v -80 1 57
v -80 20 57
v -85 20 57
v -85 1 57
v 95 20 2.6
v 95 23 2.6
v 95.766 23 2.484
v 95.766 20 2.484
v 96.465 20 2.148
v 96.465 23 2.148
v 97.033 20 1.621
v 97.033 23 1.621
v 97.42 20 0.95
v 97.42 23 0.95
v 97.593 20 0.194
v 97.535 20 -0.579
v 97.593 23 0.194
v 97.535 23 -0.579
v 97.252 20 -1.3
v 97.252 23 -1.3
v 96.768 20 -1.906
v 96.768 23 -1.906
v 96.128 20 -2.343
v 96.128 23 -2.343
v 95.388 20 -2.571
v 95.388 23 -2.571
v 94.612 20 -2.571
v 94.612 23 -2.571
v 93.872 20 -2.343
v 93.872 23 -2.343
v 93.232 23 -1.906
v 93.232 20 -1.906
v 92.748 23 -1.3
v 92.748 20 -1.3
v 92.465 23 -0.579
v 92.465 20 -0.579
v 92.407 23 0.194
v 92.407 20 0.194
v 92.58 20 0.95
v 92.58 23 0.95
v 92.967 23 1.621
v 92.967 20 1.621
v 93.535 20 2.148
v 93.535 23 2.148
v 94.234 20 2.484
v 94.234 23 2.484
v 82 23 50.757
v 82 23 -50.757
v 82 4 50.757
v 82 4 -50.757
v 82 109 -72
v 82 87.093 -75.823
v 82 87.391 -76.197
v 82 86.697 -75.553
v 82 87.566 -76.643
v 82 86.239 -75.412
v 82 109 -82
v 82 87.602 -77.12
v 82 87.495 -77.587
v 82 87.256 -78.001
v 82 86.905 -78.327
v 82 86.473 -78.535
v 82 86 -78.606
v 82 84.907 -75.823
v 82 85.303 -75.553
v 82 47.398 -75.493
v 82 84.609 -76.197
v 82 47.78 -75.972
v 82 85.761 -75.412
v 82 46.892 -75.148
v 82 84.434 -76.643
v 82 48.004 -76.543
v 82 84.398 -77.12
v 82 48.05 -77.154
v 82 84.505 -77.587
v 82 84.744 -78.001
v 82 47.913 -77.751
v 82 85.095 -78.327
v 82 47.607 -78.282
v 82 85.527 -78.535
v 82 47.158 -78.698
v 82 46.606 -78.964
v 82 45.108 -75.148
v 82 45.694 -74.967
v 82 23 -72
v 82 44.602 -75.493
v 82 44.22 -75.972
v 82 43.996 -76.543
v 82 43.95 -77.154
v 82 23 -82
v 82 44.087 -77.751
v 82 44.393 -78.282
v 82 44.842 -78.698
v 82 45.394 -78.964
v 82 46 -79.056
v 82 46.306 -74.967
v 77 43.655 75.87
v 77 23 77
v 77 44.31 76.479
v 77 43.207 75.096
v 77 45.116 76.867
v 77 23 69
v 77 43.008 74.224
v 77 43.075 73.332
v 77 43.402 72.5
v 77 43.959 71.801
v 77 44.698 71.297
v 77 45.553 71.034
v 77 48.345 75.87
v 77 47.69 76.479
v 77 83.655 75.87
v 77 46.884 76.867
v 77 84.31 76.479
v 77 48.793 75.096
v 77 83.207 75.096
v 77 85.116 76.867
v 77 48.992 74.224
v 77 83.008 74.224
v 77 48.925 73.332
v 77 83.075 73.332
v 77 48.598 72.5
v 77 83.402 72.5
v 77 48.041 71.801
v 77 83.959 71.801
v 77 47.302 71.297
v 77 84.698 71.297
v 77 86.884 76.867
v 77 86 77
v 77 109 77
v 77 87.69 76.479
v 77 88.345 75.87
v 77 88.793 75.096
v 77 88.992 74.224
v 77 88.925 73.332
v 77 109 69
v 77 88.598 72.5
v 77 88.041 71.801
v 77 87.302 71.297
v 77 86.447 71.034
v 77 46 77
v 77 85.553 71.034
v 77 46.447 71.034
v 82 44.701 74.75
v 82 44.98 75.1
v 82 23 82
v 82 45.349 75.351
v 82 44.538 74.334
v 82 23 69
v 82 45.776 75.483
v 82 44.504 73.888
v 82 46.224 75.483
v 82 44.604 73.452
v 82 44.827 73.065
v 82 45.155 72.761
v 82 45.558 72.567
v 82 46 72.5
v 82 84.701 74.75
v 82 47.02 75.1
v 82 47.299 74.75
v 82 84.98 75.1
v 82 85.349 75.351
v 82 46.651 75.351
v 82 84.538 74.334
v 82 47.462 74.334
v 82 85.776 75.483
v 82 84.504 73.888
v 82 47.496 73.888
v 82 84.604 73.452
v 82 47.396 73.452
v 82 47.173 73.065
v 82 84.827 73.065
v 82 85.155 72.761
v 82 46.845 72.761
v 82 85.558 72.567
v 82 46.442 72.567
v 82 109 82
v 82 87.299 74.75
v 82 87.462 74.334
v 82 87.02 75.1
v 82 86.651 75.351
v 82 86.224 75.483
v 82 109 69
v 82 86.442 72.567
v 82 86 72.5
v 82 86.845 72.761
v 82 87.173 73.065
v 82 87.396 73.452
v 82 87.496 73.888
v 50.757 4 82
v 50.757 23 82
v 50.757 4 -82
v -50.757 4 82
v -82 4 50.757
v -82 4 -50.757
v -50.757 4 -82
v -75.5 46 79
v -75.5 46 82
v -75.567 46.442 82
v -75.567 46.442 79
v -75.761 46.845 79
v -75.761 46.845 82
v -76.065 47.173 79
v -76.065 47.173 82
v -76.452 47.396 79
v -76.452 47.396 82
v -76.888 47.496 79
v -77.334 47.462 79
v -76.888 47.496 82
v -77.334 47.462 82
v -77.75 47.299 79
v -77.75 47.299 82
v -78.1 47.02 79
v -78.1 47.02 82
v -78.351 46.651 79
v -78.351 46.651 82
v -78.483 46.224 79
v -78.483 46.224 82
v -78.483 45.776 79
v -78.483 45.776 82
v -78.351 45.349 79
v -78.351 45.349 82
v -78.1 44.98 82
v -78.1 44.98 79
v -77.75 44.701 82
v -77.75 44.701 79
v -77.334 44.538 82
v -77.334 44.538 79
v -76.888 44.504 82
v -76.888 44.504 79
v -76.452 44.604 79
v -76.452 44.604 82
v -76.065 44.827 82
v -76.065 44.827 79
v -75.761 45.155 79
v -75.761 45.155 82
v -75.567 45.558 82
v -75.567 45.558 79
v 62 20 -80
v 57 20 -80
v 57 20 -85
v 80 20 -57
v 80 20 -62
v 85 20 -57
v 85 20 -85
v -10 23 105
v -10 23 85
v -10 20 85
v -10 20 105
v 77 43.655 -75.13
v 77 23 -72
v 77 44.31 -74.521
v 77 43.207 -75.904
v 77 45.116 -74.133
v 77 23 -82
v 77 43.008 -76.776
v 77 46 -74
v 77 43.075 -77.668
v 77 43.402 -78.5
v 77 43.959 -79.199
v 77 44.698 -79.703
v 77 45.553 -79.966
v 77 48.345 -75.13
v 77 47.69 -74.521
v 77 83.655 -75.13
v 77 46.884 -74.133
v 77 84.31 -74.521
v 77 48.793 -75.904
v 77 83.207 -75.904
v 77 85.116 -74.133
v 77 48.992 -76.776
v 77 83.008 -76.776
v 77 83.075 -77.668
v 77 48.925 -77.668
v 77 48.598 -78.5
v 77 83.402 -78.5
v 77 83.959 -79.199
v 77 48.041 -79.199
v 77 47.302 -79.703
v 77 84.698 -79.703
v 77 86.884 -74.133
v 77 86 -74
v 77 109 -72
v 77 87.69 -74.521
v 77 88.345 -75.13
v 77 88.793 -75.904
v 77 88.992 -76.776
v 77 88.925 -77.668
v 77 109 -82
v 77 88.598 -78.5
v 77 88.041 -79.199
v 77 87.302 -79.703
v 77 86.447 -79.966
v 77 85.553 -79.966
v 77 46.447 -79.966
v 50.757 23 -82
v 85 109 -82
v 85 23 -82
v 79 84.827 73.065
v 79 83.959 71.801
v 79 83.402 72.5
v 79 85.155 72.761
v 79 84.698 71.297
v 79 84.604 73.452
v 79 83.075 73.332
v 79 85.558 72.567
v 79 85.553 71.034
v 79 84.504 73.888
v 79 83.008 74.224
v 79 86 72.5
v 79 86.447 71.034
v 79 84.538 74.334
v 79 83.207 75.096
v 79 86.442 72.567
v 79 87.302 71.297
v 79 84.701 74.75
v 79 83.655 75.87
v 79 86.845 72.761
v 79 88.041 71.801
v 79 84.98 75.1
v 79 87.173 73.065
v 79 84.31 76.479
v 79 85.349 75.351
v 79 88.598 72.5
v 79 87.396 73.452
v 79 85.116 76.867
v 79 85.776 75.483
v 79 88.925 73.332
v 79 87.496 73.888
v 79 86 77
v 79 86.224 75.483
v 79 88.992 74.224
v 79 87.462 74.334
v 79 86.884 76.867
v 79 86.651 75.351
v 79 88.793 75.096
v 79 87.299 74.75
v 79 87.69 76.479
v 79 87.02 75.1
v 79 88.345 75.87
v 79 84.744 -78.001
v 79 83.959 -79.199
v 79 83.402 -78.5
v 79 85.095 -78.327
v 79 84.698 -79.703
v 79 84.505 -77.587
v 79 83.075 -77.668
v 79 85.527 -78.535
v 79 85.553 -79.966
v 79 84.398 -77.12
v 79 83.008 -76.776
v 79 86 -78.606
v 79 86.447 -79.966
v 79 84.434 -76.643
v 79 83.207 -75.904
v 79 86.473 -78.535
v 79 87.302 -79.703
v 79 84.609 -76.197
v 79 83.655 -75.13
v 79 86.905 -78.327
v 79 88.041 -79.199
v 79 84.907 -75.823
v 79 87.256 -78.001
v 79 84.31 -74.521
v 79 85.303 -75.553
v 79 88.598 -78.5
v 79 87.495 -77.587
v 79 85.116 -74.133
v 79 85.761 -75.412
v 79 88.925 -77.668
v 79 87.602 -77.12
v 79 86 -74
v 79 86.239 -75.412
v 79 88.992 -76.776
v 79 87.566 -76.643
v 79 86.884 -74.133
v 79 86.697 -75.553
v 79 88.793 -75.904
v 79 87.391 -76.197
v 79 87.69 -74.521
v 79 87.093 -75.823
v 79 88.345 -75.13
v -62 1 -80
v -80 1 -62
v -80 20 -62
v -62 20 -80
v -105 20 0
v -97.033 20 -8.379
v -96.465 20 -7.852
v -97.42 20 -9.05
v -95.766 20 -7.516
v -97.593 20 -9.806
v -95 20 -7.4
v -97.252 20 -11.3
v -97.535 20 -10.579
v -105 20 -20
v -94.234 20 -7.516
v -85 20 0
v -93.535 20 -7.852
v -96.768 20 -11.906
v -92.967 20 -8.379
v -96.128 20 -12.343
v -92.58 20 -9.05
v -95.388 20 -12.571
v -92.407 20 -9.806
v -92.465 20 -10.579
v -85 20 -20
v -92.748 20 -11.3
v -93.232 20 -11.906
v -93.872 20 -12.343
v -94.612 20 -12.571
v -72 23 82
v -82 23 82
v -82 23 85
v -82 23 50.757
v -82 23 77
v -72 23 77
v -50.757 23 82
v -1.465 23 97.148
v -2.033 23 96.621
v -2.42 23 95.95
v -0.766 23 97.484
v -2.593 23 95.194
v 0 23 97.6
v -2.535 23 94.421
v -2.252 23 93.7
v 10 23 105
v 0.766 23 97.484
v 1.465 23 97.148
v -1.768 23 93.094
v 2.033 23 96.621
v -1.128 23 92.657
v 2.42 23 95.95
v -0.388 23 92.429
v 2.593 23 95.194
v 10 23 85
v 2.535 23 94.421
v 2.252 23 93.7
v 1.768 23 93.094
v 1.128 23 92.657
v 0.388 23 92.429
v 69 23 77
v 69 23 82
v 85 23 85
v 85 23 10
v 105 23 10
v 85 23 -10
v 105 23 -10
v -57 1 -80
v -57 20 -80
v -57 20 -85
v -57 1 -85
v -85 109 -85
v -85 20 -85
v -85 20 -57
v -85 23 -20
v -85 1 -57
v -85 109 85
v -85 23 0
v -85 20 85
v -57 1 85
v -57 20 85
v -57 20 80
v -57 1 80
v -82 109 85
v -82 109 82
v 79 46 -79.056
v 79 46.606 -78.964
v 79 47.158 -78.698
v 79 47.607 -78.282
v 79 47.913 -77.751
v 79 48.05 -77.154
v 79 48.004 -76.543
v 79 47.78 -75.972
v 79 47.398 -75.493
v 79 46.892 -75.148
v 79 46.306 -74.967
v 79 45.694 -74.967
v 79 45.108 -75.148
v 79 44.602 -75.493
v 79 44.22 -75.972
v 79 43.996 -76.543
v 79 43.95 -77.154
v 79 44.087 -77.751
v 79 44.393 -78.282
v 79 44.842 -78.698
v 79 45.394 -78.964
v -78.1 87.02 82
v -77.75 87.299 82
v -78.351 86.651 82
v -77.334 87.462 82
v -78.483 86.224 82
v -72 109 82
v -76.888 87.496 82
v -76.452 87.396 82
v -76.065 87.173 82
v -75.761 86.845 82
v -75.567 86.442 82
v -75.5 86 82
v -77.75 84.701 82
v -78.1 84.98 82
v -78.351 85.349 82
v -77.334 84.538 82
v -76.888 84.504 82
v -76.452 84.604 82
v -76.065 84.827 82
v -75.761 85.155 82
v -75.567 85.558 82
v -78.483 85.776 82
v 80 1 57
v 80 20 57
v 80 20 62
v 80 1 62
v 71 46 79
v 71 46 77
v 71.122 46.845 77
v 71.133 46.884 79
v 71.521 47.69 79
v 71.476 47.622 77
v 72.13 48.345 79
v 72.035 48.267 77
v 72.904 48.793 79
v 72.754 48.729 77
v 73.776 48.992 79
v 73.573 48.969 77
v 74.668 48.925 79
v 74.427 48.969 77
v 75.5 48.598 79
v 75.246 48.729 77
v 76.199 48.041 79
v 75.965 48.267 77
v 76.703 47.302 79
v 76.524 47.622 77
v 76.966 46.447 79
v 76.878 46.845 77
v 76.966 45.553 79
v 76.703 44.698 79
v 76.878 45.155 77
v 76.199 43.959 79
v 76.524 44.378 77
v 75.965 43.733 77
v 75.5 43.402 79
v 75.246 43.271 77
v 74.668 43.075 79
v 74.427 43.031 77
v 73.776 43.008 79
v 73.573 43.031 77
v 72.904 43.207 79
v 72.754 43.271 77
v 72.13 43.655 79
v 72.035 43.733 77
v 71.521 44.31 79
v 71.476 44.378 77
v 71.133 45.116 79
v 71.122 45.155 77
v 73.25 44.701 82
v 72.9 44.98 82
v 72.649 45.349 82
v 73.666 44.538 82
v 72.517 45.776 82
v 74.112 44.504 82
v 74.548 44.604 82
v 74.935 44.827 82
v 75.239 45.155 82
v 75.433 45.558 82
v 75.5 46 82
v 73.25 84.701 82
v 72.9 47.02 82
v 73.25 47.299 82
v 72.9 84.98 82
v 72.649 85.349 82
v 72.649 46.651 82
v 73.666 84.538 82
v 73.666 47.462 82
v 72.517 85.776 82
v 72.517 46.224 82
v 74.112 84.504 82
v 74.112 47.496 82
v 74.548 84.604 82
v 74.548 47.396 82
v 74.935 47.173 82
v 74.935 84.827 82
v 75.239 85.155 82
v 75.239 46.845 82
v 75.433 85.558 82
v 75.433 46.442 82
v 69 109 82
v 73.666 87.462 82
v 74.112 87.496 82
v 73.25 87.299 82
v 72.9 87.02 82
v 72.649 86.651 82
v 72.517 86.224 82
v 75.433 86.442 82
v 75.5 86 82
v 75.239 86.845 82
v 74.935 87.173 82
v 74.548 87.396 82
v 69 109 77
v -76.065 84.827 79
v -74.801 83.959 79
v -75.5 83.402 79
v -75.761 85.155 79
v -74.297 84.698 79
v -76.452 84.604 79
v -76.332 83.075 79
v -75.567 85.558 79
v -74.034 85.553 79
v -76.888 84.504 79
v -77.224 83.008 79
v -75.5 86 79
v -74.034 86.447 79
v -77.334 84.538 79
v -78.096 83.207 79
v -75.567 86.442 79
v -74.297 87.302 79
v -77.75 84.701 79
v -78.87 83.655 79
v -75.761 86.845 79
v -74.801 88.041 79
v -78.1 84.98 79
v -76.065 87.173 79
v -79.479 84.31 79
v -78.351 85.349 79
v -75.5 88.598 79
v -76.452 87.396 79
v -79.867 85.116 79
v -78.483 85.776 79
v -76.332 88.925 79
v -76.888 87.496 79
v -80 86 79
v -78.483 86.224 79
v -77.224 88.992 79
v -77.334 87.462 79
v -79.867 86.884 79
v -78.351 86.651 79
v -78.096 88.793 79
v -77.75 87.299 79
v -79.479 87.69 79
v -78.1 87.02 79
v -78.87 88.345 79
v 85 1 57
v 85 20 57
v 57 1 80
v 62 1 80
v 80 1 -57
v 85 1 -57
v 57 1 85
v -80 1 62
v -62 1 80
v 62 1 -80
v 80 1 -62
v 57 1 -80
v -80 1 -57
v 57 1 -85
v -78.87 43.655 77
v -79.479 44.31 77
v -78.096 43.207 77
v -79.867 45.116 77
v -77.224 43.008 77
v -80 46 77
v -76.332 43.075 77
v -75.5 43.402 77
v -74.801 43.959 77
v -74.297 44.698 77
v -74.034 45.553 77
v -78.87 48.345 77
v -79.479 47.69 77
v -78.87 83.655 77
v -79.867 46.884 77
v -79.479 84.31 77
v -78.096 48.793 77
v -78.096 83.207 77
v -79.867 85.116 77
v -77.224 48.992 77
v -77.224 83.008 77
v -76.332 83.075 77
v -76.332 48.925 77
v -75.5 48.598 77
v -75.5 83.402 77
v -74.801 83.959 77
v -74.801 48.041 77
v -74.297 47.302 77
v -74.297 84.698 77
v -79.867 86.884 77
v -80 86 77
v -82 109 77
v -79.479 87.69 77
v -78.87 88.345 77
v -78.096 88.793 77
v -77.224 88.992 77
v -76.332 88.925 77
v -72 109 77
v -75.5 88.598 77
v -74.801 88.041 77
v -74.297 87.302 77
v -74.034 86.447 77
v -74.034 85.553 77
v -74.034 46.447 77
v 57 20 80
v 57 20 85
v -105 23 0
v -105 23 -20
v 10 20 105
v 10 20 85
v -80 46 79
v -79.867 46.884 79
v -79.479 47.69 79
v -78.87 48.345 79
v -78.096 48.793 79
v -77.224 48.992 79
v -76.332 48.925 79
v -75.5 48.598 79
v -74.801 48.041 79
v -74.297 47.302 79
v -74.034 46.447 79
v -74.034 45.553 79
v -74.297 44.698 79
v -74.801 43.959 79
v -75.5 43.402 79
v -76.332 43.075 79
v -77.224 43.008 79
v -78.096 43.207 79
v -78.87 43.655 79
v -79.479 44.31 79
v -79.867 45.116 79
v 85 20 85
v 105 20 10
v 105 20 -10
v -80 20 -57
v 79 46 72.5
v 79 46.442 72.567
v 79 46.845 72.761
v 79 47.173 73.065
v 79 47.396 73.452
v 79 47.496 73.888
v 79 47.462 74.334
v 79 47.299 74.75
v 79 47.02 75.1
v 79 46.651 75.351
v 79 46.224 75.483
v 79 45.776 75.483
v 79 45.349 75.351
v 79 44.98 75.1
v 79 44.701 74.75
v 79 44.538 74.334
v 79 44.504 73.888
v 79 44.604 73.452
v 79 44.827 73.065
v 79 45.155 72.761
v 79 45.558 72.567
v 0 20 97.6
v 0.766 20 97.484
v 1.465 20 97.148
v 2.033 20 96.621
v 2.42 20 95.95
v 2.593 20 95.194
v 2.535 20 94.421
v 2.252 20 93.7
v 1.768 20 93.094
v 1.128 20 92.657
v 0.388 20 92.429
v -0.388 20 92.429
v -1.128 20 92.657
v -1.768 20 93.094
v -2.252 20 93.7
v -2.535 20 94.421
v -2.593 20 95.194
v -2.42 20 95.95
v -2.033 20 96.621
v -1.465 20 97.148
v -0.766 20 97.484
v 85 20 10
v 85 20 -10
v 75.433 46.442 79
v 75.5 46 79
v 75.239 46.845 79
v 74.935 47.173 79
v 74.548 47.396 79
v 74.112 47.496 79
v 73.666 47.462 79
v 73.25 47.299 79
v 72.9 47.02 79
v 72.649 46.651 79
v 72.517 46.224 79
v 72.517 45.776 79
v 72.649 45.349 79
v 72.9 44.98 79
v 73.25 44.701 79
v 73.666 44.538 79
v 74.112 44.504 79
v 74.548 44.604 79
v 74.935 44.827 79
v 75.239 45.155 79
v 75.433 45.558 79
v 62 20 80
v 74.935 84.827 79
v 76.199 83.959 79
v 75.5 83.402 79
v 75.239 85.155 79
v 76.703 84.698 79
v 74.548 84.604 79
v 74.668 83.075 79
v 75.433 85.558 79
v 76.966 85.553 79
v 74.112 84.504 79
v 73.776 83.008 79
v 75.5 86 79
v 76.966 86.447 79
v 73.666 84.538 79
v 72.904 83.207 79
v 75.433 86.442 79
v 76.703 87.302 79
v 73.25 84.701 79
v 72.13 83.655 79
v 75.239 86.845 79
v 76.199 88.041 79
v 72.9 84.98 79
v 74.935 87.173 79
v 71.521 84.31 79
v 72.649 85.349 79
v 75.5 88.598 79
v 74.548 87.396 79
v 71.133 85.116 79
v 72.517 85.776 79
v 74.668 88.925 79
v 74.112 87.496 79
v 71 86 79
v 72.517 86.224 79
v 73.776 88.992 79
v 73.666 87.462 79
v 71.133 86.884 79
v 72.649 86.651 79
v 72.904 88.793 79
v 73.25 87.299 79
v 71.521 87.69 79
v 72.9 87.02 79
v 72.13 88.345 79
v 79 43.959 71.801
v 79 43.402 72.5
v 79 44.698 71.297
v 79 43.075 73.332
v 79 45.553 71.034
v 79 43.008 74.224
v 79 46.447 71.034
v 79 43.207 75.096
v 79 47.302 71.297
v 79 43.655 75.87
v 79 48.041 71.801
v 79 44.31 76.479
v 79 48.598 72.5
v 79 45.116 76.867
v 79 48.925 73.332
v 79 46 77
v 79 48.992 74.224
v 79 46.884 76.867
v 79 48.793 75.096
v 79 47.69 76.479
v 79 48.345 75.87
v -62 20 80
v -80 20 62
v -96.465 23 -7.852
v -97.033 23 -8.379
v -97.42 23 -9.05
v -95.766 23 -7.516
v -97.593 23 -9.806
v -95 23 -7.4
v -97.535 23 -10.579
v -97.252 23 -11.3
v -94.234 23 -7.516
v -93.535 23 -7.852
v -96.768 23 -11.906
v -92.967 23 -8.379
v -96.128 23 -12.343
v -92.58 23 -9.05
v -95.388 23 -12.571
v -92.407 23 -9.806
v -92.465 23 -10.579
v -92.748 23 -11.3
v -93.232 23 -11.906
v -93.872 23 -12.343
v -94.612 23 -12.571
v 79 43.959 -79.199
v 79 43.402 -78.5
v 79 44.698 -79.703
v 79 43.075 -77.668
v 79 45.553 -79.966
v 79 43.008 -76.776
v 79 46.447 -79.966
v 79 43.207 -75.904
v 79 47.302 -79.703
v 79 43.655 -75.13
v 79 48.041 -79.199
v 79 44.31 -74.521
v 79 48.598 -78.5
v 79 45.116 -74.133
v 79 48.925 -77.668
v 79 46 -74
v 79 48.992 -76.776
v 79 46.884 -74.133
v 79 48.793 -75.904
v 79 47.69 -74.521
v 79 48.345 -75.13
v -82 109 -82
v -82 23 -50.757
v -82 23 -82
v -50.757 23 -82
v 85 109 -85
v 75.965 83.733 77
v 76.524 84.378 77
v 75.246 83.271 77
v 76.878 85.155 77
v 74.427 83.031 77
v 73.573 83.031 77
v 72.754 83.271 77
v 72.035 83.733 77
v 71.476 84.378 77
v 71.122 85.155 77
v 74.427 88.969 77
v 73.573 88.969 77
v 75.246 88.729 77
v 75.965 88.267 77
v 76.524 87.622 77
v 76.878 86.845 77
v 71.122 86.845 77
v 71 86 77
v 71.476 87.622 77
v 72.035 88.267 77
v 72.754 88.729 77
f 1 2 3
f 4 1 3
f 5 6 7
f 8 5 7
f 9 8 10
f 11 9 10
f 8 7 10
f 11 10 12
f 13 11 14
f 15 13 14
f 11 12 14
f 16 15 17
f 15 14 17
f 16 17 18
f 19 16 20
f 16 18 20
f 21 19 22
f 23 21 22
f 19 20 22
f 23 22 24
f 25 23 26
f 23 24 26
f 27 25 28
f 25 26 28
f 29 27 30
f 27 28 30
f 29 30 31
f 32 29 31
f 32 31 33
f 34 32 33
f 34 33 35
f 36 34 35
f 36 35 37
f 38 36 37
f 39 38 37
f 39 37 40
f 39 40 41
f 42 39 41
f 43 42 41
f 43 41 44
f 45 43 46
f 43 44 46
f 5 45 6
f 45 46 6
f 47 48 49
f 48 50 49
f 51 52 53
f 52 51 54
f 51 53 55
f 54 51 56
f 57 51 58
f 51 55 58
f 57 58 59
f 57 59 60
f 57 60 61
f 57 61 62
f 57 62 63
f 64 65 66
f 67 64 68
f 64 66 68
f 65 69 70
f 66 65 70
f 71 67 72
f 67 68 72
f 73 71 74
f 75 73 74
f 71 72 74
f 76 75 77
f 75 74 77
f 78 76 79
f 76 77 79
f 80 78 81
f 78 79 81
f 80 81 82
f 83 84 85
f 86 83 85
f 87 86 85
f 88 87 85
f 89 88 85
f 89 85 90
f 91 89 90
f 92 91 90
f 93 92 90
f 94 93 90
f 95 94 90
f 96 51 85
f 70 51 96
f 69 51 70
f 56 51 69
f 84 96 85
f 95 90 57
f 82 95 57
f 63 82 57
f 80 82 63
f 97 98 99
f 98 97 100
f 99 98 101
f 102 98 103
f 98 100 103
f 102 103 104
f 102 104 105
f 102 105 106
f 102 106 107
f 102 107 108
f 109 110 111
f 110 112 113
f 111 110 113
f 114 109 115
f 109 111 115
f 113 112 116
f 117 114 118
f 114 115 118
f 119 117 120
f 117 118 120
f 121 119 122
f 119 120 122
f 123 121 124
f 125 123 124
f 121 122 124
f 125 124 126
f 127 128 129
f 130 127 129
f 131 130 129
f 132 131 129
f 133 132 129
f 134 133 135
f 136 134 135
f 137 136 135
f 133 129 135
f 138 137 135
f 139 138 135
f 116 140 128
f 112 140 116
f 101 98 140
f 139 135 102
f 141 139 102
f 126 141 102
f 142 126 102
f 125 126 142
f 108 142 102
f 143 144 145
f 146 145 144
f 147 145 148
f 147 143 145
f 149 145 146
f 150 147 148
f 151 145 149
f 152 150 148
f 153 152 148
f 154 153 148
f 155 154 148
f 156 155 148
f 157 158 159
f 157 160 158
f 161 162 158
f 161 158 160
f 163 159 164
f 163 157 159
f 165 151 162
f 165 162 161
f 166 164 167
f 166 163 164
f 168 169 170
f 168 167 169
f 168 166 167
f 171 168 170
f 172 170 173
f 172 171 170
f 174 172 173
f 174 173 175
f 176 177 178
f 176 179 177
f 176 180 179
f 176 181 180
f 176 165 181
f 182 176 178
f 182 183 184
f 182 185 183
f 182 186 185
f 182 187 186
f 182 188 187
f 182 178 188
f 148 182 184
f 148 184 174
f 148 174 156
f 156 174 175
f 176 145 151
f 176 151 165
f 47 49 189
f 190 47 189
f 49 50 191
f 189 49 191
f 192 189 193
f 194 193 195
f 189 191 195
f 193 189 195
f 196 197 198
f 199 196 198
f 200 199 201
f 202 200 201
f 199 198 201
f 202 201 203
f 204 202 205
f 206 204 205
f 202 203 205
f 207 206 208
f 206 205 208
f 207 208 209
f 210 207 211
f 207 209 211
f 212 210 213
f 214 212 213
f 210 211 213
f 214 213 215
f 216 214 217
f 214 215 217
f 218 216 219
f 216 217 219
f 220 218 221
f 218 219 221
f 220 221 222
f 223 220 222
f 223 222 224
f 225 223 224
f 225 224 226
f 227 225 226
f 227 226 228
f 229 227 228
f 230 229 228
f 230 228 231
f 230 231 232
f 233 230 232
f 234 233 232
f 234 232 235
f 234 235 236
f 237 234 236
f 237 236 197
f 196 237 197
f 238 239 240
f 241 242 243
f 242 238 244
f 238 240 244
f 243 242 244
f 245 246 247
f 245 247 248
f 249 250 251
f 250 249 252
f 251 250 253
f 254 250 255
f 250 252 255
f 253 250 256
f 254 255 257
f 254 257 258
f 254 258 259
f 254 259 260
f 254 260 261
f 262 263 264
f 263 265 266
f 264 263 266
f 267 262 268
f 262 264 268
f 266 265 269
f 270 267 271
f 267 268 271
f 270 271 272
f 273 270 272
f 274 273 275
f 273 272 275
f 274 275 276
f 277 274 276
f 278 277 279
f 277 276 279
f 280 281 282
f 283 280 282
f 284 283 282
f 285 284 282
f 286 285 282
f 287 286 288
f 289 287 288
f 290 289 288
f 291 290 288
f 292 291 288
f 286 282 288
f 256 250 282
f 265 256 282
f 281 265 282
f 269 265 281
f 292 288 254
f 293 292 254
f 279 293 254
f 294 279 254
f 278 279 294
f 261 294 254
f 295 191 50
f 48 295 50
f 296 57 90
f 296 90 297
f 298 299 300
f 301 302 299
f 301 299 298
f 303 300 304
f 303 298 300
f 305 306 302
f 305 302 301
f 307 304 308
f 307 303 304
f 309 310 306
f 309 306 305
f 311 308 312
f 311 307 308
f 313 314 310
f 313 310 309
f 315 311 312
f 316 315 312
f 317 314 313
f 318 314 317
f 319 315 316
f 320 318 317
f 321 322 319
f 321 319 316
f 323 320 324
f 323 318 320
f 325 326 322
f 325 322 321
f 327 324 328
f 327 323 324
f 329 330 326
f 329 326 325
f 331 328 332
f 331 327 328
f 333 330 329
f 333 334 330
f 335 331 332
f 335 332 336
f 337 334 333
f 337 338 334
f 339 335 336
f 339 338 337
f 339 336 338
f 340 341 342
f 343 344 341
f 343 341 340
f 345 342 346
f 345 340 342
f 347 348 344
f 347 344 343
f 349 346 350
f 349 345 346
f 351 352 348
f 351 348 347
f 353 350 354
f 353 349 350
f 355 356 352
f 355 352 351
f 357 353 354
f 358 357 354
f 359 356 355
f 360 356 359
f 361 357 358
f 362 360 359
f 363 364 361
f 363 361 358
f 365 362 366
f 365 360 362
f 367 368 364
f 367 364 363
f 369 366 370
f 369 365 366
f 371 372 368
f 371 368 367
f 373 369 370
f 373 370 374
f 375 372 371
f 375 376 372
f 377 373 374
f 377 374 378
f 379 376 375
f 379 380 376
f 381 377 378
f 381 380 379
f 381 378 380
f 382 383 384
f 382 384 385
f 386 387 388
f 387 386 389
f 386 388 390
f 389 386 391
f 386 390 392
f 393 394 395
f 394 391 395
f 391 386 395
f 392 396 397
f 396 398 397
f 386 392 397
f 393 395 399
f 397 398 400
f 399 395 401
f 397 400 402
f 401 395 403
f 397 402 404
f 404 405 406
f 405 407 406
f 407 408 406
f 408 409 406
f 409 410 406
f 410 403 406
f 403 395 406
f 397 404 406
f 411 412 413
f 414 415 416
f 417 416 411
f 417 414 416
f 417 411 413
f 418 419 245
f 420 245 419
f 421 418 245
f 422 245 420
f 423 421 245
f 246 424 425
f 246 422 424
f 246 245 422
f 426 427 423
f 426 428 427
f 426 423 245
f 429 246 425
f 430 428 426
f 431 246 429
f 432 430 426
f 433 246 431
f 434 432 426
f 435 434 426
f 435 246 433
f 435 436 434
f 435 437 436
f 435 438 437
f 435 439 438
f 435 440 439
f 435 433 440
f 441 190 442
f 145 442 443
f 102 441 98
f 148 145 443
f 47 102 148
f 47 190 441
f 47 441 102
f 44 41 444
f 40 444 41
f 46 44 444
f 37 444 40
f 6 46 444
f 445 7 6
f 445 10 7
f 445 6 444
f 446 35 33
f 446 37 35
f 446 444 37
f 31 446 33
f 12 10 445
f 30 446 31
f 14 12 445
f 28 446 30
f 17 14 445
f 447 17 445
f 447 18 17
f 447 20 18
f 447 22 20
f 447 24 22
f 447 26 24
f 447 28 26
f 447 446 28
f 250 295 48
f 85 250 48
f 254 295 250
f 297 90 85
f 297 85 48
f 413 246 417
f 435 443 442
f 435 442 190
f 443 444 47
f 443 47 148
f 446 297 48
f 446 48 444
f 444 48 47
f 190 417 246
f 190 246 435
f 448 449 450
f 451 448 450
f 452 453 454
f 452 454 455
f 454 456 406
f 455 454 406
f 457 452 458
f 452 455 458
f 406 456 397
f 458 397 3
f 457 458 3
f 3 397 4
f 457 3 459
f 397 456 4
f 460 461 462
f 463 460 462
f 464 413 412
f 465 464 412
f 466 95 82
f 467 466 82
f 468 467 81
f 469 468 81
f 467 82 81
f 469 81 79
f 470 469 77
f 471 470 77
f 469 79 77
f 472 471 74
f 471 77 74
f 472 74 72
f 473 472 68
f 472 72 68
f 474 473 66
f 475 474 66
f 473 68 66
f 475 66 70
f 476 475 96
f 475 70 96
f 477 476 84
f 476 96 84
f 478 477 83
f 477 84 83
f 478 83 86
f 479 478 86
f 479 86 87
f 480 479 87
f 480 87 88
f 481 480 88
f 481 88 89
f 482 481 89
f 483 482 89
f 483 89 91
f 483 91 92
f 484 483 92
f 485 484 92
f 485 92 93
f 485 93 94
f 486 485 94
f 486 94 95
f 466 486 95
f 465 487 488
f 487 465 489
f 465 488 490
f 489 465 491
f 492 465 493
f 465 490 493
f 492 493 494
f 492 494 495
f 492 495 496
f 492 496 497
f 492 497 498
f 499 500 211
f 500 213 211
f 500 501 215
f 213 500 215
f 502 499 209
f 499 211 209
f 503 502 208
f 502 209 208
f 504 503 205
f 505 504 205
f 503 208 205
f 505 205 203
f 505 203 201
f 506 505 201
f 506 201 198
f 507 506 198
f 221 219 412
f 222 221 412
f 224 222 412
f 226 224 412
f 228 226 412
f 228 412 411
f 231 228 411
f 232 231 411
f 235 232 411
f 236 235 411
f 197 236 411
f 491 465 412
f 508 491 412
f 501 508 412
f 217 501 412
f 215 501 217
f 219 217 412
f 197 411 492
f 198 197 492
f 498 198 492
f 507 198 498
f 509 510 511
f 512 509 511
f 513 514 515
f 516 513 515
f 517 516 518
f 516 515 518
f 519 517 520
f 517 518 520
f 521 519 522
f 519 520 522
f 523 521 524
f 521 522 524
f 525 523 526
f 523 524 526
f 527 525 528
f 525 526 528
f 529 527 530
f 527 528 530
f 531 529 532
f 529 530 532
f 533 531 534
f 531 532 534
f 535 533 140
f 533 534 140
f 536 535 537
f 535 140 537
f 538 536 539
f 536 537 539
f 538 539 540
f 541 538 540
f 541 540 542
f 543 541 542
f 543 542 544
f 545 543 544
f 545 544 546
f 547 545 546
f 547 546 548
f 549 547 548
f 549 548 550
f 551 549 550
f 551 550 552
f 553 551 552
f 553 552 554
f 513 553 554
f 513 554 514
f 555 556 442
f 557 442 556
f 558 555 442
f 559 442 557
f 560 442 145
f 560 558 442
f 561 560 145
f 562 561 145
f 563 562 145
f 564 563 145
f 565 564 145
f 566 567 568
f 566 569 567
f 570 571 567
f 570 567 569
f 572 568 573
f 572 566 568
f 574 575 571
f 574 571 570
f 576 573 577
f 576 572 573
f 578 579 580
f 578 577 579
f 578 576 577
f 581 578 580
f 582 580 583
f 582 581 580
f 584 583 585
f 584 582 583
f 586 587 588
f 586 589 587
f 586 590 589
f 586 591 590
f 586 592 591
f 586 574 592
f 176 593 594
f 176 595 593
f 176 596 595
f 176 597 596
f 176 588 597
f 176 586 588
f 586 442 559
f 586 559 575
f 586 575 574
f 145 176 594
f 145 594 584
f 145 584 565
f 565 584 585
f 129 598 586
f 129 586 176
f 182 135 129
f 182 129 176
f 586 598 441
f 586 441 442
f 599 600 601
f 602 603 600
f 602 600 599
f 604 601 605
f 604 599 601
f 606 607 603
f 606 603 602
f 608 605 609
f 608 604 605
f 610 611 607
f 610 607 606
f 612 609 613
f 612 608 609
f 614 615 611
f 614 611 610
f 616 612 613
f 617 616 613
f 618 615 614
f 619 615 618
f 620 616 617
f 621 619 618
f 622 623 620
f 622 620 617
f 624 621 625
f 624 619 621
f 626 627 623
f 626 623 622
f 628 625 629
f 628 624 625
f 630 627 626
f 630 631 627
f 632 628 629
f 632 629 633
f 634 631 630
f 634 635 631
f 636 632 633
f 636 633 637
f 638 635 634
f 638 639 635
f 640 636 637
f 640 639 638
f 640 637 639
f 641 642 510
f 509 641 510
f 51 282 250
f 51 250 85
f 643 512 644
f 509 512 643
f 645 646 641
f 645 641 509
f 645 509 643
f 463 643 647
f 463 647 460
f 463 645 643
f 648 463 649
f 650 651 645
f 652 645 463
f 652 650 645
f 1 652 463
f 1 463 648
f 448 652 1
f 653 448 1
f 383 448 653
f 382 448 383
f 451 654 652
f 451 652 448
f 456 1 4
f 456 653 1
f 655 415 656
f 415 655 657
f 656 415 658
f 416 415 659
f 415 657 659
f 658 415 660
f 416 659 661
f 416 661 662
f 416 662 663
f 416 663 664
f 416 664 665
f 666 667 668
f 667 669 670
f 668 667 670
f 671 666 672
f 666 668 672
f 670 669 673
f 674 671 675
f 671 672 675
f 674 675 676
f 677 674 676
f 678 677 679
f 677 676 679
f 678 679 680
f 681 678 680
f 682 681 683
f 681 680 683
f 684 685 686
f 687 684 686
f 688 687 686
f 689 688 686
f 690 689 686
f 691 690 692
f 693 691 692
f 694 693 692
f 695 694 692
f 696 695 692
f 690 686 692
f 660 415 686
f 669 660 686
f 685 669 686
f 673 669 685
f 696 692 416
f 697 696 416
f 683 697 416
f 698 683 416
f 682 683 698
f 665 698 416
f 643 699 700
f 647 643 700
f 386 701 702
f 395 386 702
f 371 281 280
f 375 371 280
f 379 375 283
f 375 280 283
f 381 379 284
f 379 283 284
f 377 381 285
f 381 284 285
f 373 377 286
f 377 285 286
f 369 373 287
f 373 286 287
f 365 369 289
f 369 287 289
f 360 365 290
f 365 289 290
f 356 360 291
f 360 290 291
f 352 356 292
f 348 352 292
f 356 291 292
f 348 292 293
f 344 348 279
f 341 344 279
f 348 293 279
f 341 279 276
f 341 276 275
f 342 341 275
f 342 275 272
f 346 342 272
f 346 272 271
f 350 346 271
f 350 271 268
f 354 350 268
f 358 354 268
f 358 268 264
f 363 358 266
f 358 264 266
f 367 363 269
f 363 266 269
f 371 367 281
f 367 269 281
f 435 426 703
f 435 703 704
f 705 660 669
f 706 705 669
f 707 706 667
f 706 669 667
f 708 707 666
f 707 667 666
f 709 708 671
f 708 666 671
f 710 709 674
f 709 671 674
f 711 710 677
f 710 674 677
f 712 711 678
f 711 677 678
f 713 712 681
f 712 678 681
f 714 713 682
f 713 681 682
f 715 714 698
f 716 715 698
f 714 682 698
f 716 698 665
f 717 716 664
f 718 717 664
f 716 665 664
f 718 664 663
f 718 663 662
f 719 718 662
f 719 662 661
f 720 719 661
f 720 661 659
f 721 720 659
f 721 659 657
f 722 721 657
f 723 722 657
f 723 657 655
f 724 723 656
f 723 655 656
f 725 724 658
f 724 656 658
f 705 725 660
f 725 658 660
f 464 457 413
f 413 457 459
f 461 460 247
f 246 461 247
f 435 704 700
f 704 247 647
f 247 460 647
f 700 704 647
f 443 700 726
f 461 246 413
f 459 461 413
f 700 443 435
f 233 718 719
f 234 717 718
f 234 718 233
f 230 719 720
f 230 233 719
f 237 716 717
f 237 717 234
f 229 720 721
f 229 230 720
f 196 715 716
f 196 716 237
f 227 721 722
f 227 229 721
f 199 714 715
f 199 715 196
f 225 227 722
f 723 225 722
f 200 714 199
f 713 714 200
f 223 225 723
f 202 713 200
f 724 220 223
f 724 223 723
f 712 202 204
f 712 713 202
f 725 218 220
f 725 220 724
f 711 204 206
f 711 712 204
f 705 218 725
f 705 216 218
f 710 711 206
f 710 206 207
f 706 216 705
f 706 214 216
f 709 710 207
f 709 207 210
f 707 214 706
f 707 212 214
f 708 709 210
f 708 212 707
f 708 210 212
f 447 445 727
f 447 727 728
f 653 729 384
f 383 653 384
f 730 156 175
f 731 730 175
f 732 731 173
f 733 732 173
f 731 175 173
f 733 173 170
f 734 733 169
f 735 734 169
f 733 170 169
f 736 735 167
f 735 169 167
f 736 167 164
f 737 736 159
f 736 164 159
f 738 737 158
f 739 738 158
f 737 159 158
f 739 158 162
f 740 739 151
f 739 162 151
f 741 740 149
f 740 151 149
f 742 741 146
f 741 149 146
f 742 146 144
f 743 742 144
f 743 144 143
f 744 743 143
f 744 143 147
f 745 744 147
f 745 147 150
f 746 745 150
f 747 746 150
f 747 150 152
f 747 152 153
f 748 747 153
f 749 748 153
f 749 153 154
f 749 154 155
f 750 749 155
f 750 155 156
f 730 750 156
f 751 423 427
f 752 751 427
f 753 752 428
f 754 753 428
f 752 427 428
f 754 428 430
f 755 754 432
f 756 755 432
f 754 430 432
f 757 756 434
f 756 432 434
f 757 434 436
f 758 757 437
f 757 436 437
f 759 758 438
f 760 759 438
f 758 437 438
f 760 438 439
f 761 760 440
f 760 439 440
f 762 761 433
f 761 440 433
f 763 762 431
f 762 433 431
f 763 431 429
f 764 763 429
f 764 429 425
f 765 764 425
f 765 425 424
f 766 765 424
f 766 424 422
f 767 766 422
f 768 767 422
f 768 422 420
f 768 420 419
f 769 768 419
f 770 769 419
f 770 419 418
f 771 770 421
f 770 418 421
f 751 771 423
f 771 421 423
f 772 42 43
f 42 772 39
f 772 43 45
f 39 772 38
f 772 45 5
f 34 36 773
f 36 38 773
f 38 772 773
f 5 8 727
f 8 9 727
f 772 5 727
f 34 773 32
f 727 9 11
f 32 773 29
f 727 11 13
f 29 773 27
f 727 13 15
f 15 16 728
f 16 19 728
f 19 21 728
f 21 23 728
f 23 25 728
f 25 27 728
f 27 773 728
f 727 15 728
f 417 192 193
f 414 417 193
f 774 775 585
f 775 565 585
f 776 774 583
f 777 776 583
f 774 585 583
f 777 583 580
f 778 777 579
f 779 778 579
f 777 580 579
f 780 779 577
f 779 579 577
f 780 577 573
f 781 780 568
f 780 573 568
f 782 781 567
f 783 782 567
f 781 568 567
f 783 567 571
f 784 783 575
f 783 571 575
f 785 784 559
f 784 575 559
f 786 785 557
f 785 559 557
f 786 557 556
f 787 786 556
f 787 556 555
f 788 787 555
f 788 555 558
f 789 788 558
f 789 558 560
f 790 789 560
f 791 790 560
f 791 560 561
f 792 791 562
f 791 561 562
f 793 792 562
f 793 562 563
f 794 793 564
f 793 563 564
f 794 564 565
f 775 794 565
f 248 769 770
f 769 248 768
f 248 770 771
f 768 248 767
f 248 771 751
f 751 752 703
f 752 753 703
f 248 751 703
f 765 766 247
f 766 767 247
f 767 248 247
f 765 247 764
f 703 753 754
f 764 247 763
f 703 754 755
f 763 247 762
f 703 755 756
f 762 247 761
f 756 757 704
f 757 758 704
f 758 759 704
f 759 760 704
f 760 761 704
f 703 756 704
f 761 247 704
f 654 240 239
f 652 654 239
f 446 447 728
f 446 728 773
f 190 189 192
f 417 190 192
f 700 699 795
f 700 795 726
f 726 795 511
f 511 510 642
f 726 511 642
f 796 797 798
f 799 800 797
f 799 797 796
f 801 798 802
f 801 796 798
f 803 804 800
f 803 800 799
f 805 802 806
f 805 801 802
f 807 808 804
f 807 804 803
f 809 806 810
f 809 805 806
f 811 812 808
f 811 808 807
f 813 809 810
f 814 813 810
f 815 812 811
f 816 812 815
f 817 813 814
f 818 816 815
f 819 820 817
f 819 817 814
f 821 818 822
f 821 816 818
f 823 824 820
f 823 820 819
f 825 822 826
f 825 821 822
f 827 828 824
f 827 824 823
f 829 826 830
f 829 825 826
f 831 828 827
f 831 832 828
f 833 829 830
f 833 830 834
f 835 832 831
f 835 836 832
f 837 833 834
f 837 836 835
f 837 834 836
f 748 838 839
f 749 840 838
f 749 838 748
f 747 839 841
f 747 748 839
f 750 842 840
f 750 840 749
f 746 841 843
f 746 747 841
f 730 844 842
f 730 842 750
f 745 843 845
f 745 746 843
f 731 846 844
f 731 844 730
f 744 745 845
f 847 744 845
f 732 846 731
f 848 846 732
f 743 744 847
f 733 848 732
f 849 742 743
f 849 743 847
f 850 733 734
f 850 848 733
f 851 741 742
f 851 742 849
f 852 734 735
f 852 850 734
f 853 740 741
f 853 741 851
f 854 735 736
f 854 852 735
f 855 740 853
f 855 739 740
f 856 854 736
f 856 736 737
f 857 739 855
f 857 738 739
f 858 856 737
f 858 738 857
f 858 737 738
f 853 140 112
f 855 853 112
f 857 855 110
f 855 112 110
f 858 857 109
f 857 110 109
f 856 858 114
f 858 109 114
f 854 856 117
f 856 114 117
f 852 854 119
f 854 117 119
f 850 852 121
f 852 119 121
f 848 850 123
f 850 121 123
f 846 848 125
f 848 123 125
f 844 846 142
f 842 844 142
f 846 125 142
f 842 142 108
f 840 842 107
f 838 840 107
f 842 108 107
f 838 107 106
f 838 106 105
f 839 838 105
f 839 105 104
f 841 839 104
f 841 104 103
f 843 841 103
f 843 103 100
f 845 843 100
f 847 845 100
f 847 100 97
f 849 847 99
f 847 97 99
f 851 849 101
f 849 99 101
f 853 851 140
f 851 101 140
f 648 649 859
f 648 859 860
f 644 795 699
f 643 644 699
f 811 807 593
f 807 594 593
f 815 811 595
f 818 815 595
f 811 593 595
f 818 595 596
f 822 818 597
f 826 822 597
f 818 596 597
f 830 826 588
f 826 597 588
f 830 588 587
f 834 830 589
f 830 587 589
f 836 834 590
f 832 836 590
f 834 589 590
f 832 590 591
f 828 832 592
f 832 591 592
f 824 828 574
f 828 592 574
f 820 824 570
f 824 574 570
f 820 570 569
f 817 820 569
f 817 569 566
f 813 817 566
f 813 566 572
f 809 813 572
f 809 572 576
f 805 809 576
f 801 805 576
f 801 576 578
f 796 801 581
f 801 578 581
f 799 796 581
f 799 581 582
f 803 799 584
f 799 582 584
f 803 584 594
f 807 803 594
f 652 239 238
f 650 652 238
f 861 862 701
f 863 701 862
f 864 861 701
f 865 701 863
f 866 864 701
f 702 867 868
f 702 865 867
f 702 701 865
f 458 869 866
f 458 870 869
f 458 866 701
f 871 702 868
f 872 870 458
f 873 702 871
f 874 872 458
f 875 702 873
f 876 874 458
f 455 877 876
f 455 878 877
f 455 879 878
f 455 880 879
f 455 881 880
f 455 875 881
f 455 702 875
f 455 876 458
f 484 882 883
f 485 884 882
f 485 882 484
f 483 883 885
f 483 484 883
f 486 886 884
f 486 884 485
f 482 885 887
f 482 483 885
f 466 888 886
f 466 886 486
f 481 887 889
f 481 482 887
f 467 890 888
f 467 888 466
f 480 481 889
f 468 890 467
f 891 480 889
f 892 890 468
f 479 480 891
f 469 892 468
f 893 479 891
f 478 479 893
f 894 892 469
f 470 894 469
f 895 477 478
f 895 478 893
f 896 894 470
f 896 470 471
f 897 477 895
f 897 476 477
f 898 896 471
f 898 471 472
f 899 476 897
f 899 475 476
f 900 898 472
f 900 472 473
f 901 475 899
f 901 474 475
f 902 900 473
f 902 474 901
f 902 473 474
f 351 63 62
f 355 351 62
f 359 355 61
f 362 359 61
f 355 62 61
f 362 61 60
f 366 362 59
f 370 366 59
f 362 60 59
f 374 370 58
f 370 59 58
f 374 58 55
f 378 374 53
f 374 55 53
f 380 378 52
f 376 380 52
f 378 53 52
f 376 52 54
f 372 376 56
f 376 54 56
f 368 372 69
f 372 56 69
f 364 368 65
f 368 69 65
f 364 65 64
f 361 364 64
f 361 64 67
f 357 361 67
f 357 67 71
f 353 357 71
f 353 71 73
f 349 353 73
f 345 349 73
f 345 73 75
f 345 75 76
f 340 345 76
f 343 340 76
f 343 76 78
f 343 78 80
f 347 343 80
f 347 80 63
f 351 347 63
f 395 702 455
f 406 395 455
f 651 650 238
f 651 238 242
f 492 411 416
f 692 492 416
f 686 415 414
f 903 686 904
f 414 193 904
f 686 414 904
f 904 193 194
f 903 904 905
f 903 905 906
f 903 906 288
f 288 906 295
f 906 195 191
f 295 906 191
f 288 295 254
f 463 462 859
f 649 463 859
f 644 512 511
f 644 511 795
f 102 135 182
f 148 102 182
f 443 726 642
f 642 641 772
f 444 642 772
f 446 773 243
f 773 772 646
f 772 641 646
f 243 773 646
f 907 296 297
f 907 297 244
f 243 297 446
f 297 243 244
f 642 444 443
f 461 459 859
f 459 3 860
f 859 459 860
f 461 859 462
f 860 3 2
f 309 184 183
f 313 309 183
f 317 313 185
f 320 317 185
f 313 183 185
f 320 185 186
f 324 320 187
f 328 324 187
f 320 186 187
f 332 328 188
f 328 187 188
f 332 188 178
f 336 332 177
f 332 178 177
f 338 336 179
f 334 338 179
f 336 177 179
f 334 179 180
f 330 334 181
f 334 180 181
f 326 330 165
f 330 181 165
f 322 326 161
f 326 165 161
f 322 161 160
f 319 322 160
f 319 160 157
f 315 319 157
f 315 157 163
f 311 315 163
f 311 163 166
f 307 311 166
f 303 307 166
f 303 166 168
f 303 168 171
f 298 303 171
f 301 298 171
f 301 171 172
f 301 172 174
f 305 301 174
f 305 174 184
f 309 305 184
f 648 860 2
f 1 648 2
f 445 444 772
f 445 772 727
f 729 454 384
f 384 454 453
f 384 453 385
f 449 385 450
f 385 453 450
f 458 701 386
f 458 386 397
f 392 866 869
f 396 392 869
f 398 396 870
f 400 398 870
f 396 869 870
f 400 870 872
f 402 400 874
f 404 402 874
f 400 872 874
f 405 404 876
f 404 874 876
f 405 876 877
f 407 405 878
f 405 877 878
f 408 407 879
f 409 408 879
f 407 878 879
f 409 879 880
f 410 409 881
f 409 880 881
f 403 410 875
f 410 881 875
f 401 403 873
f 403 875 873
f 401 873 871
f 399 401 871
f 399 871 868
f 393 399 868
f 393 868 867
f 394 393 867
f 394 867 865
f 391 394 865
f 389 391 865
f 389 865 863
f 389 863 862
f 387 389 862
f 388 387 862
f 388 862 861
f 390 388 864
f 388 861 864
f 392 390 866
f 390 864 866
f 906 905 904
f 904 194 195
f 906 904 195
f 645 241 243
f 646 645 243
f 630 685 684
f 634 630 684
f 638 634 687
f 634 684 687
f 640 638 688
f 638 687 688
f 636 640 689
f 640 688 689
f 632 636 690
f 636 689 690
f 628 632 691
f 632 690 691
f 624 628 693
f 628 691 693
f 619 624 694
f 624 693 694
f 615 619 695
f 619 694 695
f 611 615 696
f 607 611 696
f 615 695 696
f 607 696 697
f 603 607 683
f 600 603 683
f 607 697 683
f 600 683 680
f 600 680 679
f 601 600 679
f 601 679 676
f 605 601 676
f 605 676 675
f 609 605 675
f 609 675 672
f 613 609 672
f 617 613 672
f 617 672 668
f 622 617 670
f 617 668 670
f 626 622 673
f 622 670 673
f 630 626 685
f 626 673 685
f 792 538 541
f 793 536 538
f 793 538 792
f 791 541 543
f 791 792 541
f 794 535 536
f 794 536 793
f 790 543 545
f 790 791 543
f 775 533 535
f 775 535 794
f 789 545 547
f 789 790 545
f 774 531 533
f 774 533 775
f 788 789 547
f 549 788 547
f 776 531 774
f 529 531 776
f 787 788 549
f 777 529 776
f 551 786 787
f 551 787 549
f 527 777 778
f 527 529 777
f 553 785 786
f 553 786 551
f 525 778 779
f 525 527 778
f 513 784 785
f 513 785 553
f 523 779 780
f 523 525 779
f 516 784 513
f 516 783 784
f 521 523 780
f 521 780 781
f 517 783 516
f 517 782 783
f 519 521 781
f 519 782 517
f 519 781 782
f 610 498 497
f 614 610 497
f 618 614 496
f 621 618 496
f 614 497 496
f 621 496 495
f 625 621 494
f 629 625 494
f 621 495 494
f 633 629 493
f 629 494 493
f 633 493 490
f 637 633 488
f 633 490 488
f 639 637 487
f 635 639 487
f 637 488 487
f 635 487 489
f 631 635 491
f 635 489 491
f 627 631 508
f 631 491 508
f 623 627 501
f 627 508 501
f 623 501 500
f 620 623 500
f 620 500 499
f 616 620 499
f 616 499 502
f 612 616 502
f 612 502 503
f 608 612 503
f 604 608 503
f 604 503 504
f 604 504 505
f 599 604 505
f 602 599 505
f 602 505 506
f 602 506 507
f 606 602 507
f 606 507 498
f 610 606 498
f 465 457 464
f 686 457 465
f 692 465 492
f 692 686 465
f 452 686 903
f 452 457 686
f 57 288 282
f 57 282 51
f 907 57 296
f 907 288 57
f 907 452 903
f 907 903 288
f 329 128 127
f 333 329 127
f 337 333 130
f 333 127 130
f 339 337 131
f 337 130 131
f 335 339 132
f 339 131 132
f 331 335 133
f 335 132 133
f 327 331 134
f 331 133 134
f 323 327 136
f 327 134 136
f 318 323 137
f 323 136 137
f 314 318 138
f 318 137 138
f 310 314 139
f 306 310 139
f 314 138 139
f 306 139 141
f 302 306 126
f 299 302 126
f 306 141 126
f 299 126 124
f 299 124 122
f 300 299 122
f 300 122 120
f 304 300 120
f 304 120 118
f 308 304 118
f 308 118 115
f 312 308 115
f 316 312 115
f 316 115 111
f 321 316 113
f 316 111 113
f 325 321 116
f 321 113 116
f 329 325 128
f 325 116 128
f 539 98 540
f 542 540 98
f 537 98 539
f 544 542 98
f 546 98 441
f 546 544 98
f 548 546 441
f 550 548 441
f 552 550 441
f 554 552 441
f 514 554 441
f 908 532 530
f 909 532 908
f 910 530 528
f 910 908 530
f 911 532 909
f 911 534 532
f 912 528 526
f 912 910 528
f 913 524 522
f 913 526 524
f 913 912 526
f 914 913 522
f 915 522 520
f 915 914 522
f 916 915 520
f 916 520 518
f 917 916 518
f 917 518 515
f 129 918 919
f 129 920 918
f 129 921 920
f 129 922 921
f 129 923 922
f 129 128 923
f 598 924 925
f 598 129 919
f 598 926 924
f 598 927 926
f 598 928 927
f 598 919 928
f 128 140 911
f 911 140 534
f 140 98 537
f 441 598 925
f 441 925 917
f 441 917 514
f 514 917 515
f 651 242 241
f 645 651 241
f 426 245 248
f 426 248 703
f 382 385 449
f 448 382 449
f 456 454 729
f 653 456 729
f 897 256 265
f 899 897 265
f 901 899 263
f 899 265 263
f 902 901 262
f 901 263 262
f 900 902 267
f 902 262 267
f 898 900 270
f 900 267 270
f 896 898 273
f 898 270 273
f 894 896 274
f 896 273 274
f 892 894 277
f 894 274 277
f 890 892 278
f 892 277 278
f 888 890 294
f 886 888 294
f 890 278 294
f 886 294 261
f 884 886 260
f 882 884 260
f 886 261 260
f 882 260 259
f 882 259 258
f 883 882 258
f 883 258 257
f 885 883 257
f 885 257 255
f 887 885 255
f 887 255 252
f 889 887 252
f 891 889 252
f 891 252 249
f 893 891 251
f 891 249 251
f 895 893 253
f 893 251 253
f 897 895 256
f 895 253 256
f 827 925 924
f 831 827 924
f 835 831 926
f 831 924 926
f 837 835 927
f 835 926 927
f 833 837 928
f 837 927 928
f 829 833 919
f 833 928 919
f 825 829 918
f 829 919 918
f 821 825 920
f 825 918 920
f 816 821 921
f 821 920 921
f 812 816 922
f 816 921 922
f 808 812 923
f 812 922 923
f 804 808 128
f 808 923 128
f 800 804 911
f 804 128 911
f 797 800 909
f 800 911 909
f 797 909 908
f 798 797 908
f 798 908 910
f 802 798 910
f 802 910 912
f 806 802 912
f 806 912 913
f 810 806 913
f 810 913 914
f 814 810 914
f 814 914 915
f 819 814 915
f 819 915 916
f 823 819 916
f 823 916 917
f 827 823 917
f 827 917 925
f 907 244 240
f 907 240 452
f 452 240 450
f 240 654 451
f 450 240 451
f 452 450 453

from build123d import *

# Parameters (mm, degrees)
EXTRUDE_1_DEPTH      = 4
EXTRUDE_2_DEPTH      = 16
SKETCH_3_W           = 170
SKETCH_3_H           = 170
CUT_EXTRUDE_2_DEPTH  = 1
EXTRUDE_3_DEPTH      = 3
EXTRUDE_4_DEPTH      = 86
SKETCH_7_W           = 10
SKETCH_7_H           = 3
SKETCH_7_W_2         = 3
SKETCH_7_H_2         = 10
EXTRUDE_6_DEPTH      = 86
SKETCH_8_R           = 1.5
CUT_EXTRUDE_3_DEPTH  = 86
SKETCH_9_R           = 1.606229087
SKETCH_9_R_2         = 2.055519853
CUT_EXTRUDE_4_DEPTH  = 86
SKETCH_10_W          = 3
SKETCH_10_H          = 3
EXTRUDE_7_DEPTH      = 86
SKETCH_11_R          = 1.5
CUT_EXTRUDE_5_DEPTH  = 86
EXTRUDE_8_DEPTH      = 86
SKETCH_13_R          = 1.5
CUT_EXTRUDE_6_DEPTH  = 86
SKETCH_14_R          = 3
CUT_EXTRUDE_7_DEPTH  = 2
SKETCH_15_R          = 1.5
CUT_EXTRUDE_8_DEPTH  = 5
SKETCH_16_R          = 3
CUT_EXTRUDE_9_DEPTH  = 2
SKETCH_17_W          = 10
SKETCH_17_H          = 2
SKETCH_17_W_2        = 2
SKETCH_17_H_2        = 10
EXTRUDE_9_DEPTH      = 86
SKETCH_18_R          = 3
CUT_EXTRUDE_10_DEPTH = 2
SKETCH_19_R          = 3
CUT_EXTRUDE_11_DEPTH = 2
SKETCH_22_W          = 20
SKETCH_22_H          = 20
SKETCH_22_R          = 2.6
EXTRUDE_10_DEPTH     = 3


with BuildPart() as part:
    # 草图1 → 凸台-拉伸1 (new body)
    with BuildSketch(Plane(origin=(0, 0, 0), x_dir=(1, 0, 0), z_dir=(0, 1, 0))):
        Polygon((-80, 62), (-62, 80), (-57, 80), (-57, 85), (57, 85), (57, 80), (62, 80), (80, 62), (80, 57), (85, 57), (85, -57), (80, -57), (80, -62), (62, -80), (57, -80), (57, -85), (-57, -85), (-57, -80), (-62, -80), (-80, -62), (-80, -57), (-85, -57), (-85, 57), (-80, 57), align=None)
    extrude(amount=EXTRUDE_1_DEPTH)

    # 草图2 → 凸台-拉伸2 (add)
    with BuildSketch(Plane(origin=(0, 4, 0), x_dir=(1, 0, 0), z_dir=(0, 1, 0))):
        Polygon((-57, 85), (57, 85), (57, 80), (62, 80), (80, 62), (80, 57), (85, 57), (85, -57), (80, -57), (80, -62), (62, -80), (57, -80), (57, -85), (-57, -85), (-57, -80), (-62, -80), (-80, -62), (-80, -57), (-85, -57), (-85, 57), (-80, 57), (-80, 62), (-62, 80), (-57, 80), align=None)
        Polygon((-82, 50.757359313), (-50.757359313, 82), (50.757359313, 82), (82, 50.757359313), (82, -50.757359313), (50.757359313, -82), (-50.757359313, -82), (-82, -50.757359313), align=None, mode=Mode.SUBTRACT)
    extrude(amount=EXTRUDE_2_DEPTH)

    # 草图3 → 切除-拉伸2 (cut)
    with BuildSketch(Plane(origin=(0, 0, 0), x_dir=(-1, 0, 0), z_dir=(0, -1, 0))):
        Rectangle(SKETCH_3_W, SKETCH_3_H)
    extrude(amount=-CUT_EXTRUDE_2_DEPTH, mode=Mode.SUBTRACT)

    # 草图4 → 凸台-拉伸3 (add)
    with BuildSketch(Plane(origin=(0, 20, 0), x_dir=(1, 0, 0), z_dir=(0, 1, 0))):
        Polygon((85, 85), (-57, 85), (-85, 85), (-85, -85), (57, -85), (85, -85), align=None)
        Polygon((82, 50.757359313), (82, -50.757359313), (50.757359313, -82), (-50.757359313, -82), (-82, -50.757359313), (-82, 50.757359313), (-50.757359313, 82), (50.757359313, 82), align=None, mode=Mode.SUBTRACT)
    extrude(amount=EXTRUDE_3_DEPTH)

    # 草图5 → 凸台-拉伸4 (add)
    with BuildSketch(Plane(origin=(0, 23, 0), x_dir=(1, 0, 0), z_dir=(0, 1, 0))):
        Polygon((85, 85), (-85, 85), (-85, -85), (-82, -85), (-82, 82), (85, 82), align=None)
    extrude(amount=EXTRUDE_4_DEPTH)

    # 草图7 → 凸台-拉伸6 (add)
    with BuildSketch(Plane(origin=(0, 23, 0), x_dir=(1, 0, 0), z_dir=(0, 1, 0))):
        with Locations((-77, -80.5)):
            Rectangle(SKETCH_7_W, SKETCH_7_H)
        with Locations((80.5, 77)):
            Rectangle(SKETCH_7_W_2, SKETCH_7_H_2)
        Polygon((72, -79), (72, -82), (82, -82), (82, -72), (79, -72), (79, -79), align=None)
    extrude(amount=EXTRUDE_6_DEPTH)

    # 草图8 → 切除-拉伸3 (cut)
    with BuildSketch(Plane.XY.offset(82)):
        with Locations((-77, 86)):
            Circle(SKETCH_8_R)
        with Locations((-77, 46)):
            Circle(SKETCH_8_R)
    extrude(amount=-CUT_EXTRUDE_3_DEPTH, mode=Mode.SUBTRACT)

    # 草图9 → 切除-拉伸4 (cut)
    with BuildSketch(Plane(origin=(82, 0, 0), x_dir=(0, 0, -1), z_dir=(1, 0, 0))):
        with Locations((77, 86)):
            Circle(SKETCH_9_R)
        with Locations((77, 46)):
            Circle(SKETCH_9_R_2)
    extrude(amount=-CUT_EXTRUDE_4_DEPTH, mode=Mode.SUBTRACT)

    # 草图10 → 凸台-拉伸7 (add)
    with BuildSketch(Plane(origin=(0, 109, 0), x_dir=(1, 0, 0), z_dir=(0, 1, 0))):
        with Locations((80.5, -70.5)):
            Rectangle(SKETCH_10_W, SKETCH_10_H)
        with Locations((70.5, -80.5)):
            Rectangle(SKETCH_10_W, SKETCH_10_H)
    extrude(amount=-EXTRUDE_7_DEPTH)

    # 草图11 → 切除-拉伸5 (cut)
    with BuildSketch(Plane.XY.offset(82)):
        with Locations((74, 86)):
            Circle(SKETCH_11_R)
        with Locations((74, 46)):
            Circle(SKETCH_11_R)
    extrude(amount=-CUT_EXTRUDE_5_DEPTH, mode=Mode.SUBTRACT)

    # 草图12 → 凸台-拉伸8 (add)
    with BuildSketch(Plane(origin=(0, 109, 0), x_dir=(1, 0, 0), z_dir=(0, 1, 0))):
        Polygon((69, -77), (69, -79), (79, -79), (79, -69), (77, -69), (77, -77), align=None)
    extrude(amount=-EXTRUDE_8_DEPTH)

    # 草图13 → 切除-拉伸6 (cut)
    with BuildSketch(Plane.XY.offset(82)):
        with Locations((74, 86)):
            Circle(SKETCH_13_R)
        with Locations((74, 46)):
            Circle(SKETCH_13_R)
    extrude(amount=-CUT_EXTRUDE_6_DEPTH, mode=Mode.SUBTRACT)

    # 草图14 → 切除-拉伸7 (cut)
    with BuildSketch(Plane(origin=(0, 0, 77), x_dir=(-1, 0, 0), z_dir=(0, 0, -1))):
        with Locations((-74, 86)):
            Circle(SKETCH_14_R)
        with Locations((-74, 46)):
            Circle(SKETCH_14_R)
    extrude(amount=-CUT_EXTRUDE_7_DEPTH, mode=Mode.SUBTRACT)

    # 草图15 → 切除-拉伸8 (cut)
    with BuildSketch(Plane(origin=(82, 0, 0), x_dir=(0, 0, -1), z_dir=(1, 0, 0))):
        with Locations((-74, 86)):
            Circle(SKETCH_15_R)
        with Locations((-74, 46)):
            Circle(SKETCH_15_R)
    extrude(amount=-CUT_EXTRUDE_8_DEPTH, mode=Mode.SUBTRACT)

    # 草图16 → 切除-拉伸9 (cut)
    with BuildSketch(Plane.ZY.offset(-77)):
        with Locations((74, 86)):
            Circle(SKETCH_16_R)
        with Locations((74, 46)):
            Circle(SKETCH_16_R)
    extrude(amount=-CUT_EXTRUDE_9_DEPTH, mode=Mode.SUBTRACT)

    # 草图17 → 凸台-拉伸9 (add)
    with BuildSketch(Plane(origin=(0, 109, 0), x_dir=(1, 0, 0), z_dir=(0, 1, 0))):
        with Locations((-77, -78)):
            Rectangle(SKETCH_17_W, SKETCH_17_H)
        with Locations((78, 77)):
            Rectangle(SKETCH_17_W_2, SKETCH_17_H_2)
    extrude(amount=-EXTRUDE_9_DEPTH)

    # 草图18 → 切除-拉伸10 (cut)
    with BuildSketch(Plane.ZY.offset(-77)):
        with Locations((-77, 86)):
            Circle(SKETCH_18_R)
        with Locations((-77, 46)):
            Circle(SKETCH_18_R)
    extrude(amount=-CUT_EXTRUDE_10_DEPTH, mode=Mode.SUBTRACT)

    # 草图19 → 切除-拉伸11 (cut)
    with BuildSketch(Plane(origin=(0, 0, 77), x_dir=(-1, 0, 0), z_dir=(0, 0, -1))):
        with Locations((77, 86)):
            Circle(SKETCH_19_R)
        with Locations((77, 46)):
            Circle(SKETCH_19_R)
    extrude(amount=-CUT_EXTRUDE_11_DEPTH, mode=Mode.SUBTRACT)

    # 草图22 → 凸台-拉伸10 (add)
    # profile 1 of 3: a face of its own
    with BuildSketch(Plane(origin=(0, 23, 0), x_dir=(1, 0, 0), z_dir=(0, 1, 0))):
        with Locations((-95, 10)):
            Rectangle(SKETCH_22_W, SKETCH_22_H)
        with Locations((-95, 10)):
            Circle(SKETCH_22_R, mode=Mode.SUBTRACT)
    # profile 2 of 3: a face of its own
    with BuildSketch(Plane(origin=(0, 23, 0), x_dir=(1, 0, 0), z_dir=(0, 1, 0))):
        with Locations((95, 0)):
            Rectangle(SKETCH_22_W, SKETCH_22_H)
        with Locations((95, 0)):
            Circle(SKETCH_22_R, mode=Mode.SUBTRACT)
    # profile 3 of 3: a face of its own
    with BuildSketch(Plane(origin=(0, 23, 0), x_dir=(1, 0, 0), z_dir=(0, 1, 0))):
        with Locations((0, -95)):
            Rectangle(SKETCH_22_W, SKETCH_22_H)
        with Locations((0, -95)):
            Circle(SKETCH_22_R, mode=Mode.SUBTRACT)
    extrude(amount=-EXTRUDE_10_DEPTH)


solid = part.part
